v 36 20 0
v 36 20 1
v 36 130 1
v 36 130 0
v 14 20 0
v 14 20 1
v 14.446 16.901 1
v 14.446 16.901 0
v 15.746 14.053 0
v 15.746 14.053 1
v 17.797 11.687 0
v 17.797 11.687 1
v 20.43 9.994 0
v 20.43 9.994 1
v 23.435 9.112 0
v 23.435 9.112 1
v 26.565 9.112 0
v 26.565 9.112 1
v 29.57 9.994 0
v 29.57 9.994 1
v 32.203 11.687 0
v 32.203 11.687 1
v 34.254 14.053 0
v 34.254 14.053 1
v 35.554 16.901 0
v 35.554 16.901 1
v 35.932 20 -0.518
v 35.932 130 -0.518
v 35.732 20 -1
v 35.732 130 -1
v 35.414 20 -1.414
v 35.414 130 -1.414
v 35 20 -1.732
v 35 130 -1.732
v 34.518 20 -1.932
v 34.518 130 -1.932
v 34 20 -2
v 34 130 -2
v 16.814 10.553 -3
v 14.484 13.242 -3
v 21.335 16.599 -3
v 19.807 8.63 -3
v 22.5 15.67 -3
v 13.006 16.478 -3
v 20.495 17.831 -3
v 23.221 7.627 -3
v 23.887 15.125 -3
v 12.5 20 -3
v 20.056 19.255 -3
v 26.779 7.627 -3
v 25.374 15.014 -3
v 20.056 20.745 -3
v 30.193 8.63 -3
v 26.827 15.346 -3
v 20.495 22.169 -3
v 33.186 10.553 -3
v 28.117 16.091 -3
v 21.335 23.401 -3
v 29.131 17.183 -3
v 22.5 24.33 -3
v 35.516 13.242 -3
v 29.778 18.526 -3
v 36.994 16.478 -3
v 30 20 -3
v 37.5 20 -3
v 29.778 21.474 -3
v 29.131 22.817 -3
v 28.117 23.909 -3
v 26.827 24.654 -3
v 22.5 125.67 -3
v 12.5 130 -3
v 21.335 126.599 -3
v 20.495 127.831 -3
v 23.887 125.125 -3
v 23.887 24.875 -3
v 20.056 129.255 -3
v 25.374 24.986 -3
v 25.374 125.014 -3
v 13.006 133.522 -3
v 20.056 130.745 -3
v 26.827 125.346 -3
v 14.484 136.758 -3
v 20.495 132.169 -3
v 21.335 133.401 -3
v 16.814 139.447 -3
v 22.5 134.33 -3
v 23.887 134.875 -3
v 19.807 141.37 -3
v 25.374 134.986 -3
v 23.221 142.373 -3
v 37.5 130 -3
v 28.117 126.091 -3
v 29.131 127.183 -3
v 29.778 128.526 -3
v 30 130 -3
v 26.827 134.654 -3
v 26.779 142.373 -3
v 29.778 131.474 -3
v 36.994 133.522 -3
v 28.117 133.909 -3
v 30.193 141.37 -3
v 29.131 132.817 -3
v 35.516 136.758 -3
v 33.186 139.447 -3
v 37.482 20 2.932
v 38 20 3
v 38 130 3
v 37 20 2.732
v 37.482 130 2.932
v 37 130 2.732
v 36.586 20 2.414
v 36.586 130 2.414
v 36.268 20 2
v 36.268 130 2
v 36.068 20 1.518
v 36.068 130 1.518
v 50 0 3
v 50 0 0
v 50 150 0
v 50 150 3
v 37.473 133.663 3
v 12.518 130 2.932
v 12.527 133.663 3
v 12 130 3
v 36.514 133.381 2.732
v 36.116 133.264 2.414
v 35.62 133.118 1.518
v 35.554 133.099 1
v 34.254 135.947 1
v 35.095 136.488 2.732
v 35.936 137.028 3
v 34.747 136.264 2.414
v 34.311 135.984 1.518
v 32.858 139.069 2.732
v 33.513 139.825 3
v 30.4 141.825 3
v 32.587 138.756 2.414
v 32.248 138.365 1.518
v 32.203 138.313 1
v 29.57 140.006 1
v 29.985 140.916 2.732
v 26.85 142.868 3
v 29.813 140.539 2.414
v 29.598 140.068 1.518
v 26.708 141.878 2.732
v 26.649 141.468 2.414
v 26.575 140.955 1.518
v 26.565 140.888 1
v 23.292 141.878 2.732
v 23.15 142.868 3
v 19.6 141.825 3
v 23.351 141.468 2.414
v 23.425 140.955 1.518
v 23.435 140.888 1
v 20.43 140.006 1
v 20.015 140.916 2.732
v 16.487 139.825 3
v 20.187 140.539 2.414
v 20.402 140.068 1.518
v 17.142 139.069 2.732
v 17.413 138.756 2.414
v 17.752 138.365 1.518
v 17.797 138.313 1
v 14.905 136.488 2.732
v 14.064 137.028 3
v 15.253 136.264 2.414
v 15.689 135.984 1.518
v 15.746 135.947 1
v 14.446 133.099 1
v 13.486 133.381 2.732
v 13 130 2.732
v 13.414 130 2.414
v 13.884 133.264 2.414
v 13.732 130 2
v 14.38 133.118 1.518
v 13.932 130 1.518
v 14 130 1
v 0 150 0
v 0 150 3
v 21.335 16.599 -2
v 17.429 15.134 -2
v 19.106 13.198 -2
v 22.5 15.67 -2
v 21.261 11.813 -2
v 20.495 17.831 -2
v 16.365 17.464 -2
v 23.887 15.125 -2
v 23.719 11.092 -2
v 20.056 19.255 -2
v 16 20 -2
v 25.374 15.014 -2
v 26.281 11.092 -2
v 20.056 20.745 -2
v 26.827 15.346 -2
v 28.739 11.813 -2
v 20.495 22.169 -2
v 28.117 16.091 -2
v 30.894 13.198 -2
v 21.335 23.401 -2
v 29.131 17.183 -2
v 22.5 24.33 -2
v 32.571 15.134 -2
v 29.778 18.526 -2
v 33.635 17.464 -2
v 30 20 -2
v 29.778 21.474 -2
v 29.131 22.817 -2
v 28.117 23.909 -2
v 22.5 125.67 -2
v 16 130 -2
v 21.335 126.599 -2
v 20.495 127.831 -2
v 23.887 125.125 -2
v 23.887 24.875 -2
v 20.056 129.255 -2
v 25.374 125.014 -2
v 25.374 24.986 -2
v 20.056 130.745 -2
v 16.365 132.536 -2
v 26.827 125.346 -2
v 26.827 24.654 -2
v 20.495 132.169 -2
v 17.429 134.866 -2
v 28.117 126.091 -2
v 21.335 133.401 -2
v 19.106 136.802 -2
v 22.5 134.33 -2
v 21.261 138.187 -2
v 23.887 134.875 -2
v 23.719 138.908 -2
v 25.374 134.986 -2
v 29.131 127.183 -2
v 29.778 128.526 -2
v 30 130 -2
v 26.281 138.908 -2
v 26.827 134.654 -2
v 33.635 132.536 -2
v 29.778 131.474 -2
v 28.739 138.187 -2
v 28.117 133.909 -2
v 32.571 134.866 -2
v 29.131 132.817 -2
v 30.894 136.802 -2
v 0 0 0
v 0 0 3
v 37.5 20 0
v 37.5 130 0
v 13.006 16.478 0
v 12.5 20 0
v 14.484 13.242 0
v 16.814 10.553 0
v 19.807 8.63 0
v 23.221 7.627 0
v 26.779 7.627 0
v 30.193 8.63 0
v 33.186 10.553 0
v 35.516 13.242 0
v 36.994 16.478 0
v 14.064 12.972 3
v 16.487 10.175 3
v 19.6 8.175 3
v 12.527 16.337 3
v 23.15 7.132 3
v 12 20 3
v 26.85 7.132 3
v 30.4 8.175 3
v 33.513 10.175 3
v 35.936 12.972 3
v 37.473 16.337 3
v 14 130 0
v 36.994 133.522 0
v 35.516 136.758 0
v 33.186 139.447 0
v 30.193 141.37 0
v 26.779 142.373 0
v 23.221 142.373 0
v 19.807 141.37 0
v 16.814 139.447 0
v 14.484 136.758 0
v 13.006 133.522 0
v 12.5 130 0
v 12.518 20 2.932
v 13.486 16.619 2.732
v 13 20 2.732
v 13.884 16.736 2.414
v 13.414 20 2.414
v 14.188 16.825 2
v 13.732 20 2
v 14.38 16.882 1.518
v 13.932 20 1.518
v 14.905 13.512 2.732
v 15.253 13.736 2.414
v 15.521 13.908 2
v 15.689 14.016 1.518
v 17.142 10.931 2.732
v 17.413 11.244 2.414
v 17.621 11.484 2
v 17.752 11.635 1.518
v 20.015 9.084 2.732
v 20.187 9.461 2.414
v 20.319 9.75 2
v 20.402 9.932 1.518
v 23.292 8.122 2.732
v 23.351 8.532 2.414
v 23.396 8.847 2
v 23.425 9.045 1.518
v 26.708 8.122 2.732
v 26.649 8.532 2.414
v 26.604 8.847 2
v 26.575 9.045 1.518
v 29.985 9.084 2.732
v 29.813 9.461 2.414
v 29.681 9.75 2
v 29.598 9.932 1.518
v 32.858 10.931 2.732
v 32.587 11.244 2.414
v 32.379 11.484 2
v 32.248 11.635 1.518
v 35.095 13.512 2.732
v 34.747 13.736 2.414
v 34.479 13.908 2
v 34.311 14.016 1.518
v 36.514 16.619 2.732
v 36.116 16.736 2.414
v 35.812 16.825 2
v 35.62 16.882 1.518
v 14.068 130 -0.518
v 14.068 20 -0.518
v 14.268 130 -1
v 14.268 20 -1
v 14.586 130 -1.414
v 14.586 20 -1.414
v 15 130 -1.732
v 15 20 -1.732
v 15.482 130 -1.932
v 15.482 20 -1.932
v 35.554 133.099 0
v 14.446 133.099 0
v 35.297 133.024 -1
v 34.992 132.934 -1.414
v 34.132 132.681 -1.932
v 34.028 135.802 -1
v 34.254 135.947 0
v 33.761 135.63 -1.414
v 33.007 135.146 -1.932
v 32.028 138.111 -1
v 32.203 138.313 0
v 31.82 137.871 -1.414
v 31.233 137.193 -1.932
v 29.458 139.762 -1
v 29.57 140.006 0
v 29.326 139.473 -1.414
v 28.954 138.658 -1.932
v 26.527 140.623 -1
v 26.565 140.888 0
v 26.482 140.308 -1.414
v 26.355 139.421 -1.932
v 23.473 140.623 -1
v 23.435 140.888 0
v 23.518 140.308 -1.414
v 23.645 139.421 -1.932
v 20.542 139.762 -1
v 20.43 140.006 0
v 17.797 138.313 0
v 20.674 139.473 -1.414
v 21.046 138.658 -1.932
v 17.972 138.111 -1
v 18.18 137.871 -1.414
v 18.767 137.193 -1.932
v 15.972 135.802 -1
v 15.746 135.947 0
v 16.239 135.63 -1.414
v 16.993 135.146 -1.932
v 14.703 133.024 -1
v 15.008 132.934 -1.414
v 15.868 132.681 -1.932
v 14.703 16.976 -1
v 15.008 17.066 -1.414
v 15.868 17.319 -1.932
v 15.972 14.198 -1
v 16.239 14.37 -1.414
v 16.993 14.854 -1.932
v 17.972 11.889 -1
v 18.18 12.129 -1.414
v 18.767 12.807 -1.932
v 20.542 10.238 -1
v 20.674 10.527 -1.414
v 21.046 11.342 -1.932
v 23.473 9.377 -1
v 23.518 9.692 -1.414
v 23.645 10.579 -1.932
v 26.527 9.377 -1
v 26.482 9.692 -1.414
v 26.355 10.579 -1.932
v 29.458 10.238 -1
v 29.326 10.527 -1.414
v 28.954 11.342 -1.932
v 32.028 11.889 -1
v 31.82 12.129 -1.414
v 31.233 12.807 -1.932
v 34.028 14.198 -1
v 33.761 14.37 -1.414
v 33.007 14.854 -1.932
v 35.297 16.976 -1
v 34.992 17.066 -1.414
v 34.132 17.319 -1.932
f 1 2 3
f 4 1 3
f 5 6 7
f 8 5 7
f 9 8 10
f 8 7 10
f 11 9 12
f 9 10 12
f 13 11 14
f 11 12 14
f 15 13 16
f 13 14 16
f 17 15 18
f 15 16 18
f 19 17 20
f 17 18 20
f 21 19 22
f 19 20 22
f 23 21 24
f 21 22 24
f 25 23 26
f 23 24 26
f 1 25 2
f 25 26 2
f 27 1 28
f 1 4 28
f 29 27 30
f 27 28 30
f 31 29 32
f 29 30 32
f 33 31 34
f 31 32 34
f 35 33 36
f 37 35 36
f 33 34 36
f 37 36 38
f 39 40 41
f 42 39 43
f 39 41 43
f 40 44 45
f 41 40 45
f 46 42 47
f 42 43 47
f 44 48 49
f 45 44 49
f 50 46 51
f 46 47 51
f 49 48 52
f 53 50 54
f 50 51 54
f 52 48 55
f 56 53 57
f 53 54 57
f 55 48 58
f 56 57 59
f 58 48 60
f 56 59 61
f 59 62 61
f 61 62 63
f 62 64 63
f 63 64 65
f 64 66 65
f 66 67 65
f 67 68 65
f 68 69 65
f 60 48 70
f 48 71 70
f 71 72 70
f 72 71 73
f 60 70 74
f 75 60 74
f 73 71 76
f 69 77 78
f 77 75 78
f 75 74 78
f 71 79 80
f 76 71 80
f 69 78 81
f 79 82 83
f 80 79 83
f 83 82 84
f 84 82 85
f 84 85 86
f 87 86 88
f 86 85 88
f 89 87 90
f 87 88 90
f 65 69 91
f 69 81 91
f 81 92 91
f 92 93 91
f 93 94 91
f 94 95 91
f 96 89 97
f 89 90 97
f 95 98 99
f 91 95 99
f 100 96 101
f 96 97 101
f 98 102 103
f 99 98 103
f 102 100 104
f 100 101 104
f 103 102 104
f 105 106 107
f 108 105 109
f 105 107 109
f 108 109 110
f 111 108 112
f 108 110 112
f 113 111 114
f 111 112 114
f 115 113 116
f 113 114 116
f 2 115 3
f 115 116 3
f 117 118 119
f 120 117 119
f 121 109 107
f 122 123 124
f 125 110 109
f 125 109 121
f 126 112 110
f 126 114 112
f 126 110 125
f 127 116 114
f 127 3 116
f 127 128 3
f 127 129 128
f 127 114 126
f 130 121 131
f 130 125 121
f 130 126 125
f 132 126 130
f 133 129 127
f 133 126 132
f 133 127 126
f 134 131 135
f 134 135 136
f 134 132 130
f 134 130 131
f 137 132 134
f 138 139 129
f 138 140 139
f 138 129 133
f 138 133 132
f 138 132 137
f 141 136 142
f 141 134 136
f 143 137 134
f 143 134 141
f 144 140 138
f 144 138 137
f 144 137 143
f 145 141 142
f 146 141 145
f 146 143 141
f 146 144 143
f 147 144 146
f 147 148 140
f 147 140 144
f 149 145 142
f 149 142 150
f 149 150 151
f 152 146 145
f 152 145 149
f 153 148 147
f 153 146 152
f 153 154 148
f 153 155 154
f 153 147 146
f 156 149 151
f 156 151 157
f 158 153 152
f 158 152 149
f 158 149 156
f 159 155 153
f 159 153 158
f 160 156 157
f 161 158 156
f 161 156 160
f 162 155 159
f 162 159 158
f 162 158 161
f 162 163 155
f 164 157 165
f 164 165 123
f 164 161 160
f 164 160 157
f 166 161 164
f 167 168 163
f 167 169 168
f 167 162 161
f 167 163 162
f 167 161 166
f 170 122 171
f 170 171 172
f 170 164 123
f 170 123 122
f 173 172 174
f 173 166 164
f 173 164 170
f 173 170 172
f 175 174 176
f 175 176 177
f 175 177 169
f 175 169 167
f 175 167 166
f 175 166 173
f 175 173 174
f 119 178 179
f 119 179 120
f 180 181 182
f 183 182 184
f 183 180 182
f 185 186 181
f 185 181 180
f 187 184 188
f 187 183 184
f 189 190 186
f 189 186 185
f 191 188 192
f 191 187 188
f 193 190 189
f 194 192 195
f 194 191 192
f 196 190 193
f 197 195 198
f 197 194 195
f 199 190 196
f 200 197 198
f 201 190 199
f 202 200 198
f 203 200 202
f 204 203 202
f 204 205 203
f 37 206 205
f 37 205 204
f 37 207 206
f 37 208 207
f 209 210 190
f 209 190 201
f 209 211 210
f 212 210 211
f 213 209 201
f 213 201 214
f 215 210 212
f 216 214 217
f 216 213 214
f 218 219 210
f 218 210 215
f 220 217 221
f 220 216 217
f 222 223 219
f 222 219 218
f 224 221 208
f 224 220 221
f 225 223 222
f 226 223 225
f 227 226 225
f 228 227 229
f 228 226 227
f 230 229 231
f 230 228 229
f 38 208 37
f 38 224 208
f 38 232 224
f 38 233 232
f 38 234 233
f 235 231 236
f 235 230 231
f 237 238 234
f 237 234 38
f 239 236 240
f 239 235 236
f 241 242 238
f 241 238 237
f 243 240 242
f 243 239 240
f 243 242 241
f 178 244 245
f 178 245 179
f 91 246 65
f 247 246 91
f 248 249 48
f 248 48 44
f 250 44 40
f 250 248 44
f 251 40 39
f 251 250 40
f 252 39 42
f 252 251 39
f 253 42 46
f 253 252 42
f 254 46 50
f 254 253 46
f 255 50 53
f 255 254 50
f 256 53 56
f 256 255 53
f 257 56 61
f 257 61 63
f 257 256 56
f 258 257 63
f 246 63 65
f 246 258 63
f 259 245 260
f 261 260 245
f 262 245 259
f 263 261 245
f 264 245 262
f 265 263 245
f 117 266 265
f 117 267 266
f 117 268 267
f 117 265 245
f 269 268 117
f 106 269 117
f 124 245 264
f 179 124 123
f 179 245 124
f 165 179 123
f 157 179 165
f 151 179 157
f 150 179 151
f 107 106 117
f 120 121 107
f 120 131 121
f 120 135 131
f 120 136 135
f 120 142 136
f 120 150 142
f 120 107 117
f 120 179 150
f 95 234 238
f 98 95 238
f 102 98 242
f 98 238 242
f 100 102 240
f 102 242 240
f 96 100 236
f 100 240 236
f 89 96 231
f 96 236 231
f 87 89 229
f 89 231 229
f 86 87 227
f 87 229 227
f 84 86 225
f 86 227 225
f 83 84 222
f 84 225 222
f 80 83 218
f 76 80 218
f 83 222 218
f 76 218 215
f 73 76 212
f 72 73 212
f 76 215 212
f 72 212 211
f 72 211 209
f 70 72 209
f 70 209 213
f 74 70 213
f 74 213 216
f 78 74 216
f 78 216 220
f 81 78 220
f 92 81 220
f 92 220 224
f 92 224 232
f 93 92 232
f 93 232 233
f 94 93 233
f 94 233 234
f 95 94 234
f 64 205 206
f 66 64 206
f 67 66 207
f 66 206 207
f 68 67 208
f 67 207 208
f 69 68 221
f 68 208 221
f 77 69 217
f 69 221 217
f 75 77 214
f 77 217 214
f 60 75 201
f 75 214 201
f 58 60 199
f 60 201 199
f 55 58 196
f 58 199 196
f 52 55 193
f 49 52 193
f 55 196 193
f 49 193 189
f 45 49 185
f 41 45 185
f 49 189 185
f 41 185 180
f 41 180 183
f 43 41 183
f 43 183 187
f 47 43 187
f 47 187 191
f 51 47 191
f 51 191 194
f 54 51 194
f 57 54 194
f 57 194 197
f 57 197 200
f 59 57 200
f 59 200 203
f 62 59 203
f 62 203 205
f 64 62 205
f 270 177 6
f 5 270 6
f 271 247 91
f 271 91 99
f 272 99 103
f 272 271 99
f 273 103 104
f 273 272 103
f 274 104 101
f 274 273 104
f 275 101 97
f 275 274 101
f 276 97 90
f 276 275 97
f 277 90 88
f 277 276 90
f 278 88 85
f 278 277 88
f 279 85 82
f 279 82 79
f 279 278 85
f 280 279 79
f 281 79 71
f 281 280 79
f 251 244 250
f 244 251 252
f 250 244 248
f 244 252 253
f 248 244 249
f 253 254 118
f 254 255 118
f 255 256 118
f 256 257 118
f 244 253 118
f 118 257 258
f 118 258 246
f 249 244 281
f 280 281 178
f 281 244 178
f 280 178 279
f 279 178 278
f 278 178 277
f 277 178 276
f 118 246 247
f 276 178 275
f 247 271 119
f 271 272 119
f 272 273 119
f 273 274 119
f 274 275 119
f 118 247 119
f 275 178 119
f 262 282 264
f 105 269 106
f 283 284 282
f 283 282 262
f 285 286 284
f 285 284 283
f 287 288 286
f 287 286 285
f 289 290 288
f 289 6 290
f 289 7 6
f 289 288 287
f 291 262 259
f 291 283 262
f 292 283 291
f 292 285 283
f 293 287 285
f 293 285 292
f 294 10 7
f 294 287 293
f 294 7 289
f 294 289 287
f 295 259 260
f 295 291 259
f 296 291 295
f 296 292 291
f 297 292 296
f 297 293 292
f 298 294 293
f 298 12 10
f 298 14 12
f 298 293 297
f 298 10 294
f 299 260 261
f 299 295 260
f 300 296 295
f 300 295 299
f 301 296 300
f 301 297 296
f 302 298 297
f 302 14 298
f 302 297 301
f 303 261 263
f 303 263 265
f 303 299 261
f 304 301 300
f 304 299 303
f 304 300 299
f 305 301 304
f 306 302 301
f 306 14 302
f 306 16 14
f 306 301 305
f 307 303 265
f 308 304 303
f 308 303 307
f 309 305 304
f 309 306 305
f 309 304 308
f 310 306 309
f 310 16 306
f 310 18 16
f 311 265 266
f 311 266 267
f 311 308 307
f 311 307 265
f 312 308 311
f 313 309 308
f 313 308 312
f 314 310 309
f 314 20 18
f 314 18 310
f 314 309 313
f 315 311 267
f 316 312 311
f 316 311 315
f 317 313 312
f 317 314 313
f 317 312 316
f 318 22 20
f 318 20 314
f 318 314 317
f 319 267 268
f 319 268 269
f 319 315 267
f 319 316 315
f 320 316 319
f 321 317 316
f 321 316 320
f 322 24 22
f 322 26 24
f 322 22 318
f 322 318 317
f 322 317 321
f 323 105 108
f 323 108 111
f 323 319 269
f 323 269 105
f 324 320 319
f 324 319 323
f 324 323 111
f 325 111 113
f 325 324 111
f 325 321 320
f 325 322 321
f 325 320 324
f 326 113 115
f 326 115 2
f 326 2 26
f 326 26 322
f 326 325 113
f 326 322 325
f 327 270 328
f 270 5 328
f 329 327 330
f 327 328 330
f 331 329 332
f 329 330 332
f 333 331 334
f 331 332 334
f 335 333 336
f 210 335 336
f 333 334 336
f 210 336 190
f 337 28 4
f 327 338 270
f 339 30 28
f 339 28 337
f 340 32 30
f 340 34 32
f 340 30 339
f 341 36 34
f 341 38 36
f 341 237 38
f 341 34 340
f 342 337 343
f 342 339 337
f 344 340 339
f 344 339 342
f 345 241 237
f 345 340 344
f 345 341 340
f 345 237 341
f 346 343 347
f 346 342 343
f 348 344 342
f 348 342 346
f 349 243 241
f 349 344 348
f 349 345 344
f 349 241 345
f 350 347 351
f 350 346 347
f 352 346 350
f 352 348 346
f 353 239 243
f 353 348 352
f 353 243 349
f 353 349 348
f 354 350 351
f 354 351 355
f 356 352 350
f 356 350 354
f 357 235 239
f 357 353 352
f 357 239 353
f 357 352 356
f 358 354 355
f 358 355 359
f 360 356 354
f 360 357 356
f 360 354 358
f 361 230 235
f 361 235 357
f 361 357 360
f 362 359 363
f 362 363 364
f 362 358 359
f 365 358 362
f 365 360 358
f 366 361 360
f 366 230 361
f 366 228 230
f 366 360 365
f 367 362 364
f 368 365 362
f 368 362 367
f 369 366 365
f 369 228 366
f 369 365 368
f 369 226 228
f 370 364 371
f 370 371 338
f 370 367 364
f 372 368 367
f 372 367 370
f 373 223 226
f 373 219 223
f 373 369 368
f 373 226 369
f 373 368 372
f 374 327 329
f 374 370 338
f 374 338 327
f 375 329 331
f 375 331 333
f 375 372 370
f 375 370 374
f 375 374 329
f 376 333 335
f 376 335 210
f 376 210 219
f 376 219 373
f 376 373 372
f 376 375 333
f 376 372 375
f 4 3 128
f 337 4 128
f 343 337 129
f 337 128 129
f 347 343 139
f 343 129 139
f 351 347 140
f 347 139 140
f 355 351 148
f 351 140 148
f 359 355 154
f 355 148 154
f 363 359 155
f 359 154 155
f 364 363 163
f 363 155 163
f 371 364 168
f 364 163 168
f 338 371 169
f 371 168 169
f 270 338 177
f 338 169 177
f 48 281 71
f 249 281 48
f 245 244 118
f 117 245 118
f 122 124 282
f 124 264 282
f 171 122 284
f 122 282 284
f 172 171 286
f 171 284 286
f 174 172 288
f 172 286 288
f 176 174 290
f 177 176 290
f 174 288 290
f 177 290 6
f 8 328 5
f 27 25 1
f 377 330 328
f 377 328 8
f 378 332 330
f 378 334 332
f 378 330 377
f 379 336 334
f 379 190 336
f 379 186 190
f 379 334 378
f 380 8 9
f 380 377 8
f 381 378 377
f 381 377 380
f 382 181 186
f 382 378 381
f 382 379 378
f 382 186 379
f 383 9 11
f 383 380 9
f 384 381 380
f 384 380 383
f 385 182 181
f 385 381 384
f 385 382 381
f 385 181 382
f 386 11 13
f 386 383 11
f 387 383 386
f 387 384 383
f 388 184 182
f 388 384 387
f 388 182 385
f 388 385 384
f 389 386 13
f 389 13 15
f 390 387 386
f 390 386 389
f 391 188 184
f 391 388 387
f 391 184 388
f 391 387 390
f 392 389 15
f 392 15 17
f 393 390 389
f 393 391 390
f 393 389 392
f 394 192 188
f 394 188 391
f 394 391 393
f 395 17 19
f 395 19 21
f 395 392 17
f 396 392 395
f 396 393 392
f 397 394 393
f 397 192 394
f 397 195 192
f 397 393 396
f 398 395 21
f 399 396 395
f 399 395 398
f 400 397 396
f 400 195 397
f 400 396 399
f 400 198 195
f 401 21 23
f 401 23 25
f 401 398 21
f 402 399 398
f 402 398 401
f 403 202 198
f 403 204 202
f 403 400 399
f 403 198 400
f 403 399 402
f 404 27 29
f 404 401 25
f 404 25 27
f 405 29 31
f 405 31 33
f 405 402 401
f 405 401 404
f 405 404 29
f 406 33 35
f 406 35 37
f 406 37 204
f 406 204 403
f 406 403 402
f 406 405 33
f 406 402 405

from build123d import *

# Parameters (mm, degrees)
F0_W     = 50
F0_H     = 150
F1_DEPTH = 3
F4_DEPTH = 6
F2_R     = 5
F5_DEPTH = 6.001
F6_DEPTH = 5
F7_R     = 2


with BuildPart() as f1:
    # F0 (on Top) → F1 (new body)
    with BuildSketch(Plane.XY):
        with Locations((25, 75)):
            Rectangle(F0_W, F0_H)
    extrude(amount=F1_DEPTH)

    # F3 (on face) → F4 (join)
    with BuildSketch(Plane.XY.offset(3)):
        with BuildLine():
            Line((37.5, 20), (37.5, 130))
            ThreePointArc((37.5, 130), (25, 142.5), (12.5, 130))
            Line((12.5, 130), (12.5, 20))
            ThreePointArc((12.5, 20), (25, 7.5), (37.5, 20))
        make_face()
        with BuildLine():
            ThreePointArc((36, 20), (25, 9), (14, 20))
            Line((14, 20), (14, 130))
            ThreePointArc((14, 130), (25, 141), (36, 130))
            Line((36, 130), (36, 20))
        make_face(mode=Mode.SUBTRACT)
        with BuildLine():
            Line((14, 130), (14, 20))
            ThreePointArc((14, 20), (25, 9), (36, 20))
            Line((36, 20), (36, 130))
            ThreePointArc((36, 130), (25, 141), (14, 130))
        make_face()
    extrude(amount=-F4_DEPTH)

    # F2 (on face) → F5 (cut, through all)
    with BuildSketch(Plane.XY.offset(3)):
        with Locations((25, 20)):
            Circle(F2_R)
        with Locations((25, 130)):
            Circle(F2_R)
    extrude(amount=-F5_DEPTH, mode=Mode.SUBTRACT)

    # F3 (on face) → F6 (cut)
    with BuildSketch(Plane.XY.offset(3)):
        with BuildLine():
            Line((14, 130), (14, 20))
            ThreePointArc((14, 20), (25, 9), (36, 20))
            Line((36, 20), (36, 130))
            ThreePointArc((36, 130), (25, 141), (14, 130))
        make_face()
    extrude(amount=-F6_DEPTH, mode=Mode.SUBTRACT)

    # F7
    f7_edges = [f1.edges().sort_by_distance(p)[0] for p in [
        (14, 75, 3),
        (14, 75, -2),
    ]]
    fillet(f7_edges, radius=F7_R)


solid = f1.part
